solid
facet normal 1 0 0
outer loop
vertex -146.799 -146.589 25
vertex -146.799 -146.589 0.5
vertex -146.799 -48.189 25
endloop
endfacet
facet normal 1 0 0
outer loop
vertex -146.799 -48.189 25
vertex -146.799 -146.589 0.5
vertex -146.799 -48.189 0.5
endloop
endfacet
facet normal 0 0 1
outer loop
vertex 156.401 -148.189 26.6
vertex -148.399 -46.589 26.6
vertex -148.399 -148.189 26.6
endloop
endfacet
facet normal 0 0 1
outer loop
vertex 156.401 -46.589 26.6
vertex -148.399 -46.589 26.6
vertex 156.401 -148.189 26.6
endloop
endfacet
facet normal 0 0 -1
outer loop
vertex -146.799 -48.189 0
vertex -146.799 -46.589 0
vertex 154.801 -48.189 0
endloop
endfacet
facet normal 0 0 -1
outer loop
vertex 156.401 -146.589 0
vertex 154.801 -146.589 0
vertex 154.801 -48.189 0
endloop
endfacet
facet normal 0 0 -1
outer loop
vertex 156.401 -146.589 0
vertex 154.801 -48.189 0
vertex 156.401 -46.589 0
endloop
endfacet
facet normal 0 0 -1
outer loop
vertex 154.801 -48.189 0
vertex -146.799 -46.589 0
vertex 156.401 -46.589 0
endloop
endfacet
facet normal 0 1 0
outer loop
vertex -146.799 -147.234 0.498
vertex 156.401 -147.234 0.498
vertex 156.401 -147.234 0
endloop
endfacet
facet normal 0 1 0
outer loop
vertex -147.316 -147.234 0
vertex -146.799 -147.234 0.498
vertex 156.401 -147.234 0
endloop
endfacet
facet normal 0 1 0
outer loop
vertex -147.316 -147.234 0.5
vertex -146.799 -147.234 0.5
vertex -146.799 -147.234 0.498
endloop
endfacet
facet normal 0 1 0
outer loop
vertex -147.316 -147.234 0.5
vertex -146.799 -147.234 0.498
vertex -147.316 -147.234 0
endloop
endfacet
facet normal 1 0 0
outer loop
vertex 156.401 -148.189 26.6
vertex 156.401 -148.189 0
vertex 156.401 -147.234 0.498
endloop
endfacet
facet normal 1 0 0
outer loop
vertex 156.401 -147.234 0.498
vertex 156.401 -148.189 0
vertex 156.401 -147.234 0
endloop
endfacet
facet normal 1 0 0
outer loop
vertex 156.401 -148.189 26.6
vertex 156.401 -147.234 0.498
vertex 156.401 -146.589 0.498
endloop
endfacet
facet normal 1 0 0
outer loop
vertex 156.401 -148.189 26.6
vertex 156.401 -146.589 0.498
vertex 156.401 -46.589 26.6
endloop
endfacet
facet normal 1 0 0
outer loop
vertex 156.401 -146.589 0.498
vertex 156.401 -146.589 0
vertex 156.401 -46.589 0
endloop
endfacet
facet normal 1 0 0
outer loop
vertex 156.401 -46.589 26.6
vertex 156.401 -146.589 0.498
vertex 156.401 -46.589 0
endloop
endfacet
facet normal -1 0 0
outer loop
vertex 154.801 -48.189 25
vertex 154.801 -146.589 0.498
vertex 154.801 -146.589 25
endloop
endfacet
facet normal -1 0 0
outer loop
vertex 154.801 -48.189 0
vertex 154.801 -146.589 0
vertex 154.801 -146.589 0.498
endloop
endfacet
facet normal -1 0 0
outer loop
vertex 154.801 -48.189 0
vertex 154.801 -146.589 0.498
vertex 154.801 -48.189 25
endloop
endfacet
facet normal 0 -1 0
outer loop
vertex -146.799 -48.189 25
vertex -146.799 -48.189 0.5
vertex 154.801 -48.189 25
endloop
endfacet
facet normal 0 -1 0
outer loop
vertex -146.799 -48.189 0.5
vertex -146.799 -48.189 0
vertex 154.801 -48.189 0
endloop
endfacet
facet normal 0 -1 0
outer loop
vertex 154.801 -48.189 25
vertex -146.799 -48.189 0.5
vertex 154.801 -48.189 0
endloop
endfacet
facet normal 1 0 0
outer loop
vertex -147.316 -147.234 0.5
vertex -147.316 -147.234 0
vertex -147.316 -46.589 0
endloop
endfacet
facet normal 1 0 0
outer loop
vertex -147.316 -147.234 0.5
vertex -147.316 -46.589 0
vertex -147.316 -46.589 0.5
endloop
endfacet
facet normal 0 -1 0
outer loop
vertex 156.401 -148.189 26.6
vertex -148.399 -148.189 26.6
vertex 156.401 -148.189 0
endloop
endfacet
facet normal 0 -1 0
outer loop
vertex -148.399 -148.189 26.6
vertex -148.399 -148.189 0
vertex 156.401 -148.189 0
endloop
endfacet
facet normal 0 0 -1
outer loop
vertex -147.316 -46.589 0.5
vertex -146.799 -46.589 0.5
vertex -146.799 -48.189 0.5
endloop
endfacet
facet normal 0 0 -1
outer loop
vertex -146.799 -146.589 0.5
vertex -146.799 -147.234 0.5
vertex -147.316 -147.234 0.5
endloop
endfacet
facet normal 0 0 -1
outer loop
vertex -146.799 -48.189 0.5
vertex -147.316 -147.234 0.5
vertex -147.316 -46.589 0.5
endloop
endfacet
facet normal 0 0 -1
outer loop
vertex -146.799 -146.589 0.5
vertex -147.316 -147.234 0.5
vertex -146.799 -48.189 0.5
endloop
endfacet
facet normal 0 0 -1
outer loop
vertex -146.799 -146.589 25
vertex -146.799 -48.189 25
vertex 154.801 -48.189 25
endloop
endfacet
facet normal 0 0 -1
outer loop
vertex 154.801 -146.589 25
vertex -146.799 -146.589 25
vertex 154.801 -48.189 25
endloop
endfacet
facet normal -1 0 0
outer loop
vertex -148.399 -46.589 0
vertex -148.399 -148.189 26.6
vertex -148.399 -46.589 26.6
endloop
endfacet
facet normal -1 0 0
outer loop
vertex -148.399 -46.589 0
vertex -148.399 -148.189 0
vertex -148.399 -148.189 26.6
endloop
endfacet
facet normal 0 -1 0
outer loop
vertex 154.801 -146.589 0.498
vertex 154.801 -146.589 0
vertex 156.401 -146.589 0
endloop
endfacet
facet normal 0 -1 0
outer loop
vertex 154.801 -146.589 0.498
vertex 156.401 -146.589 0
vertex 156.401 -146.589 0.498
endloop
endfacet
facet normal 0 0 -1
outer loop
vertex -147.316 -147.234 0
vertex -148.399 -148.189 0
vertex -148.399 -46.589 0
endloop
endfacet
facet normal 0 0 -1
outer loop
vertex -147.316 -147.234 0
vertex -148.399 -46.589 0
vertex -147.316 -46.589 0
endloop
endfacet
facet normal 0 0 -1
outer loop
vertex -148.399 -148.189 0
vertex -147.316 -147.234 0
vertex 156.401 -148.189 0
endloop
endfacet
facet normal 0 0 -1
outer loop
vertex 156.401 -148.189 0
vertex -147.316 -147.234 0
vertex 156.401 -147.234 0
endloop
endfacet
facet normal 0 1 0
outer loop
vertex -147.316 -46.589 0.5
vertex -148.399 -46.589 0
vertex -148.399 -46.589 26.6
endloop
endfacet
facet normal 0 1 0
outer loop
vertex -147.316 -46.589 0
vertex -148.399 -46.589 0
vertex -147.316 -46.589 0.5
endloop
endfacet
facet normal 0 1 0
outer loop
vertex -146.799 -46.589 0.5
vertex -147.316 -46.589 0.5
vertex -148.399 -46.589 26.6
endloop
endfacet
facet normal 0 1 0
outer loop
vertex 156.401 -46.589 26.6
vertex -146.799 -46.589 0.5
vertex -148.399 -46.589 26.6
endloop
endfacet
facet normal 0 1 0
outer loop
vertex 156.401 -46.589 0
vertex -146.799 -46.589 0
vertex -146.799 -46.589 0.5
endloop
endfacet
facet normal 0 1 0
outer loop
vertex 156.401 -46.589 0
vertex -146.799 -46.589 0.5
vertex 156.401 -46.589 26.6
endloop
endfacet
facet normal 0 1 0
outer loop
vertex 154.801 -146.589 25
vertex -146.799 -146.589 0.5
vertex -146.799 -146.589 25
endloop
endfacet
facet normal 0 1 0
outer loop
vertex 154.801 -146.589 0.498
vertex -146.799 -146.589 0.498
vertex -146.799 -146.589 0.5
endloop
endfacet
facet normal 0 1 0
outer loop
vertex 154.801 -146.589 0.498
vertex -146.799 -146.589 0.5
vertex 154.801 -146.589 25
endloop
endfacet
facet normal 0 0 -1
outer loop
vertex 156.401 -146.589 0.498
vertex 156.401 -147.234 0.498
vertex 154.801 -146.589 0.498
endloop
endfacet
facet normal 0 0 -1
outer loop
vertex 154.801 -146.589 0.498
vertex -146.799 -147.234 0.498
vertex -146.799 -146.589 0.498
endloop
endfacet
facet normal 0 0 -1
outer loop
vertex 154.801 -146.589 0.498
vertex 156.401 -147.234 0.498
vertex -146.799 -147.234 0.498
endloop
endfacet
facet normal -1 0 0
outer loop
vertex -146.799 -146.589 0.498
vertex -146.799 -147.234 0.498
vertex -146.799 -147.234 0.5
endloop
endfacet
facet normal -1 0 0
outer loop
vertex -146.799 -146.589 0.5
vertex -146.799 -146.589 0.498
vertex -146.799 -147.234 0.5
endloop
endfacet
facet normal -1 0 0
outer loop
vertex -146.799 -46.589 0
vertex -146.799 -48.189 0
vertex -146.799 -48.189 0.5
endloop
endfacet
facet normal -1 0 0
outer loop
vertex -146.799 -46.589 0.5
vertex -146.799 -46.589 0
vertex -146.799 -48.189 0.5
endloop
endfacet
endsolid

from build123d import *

# Parameters (mm, degrees)
F0_W     = 304.8
F0_H     = 101.6
F0_W_2   = 301.6
F0_H_2   = 98.4
F1_DEPTH = 25
F2_W     = 304.8
F2_H     = 101.6
F3_DEPTH = 1.6
F4_W     = 0.644748
F4_H     = 0.498444
F5_DEPTH = 303.2
F6_W     = 0.51682
F6_H     = 0.5
F7_DEPTH = 100.644748


with BuildPart() as f1:
    # F0 (on Top) → F1 (new body)
    with BuildSketch(Plane.XY):
        with Locations((4.001044, -97.389185)):
            Rectangle(F0_W, F0_H)
        with Locations((4.001044, -97.389185)):
            Rectangle(F0_W_2, F0_H_2, mode=Mode.SUBTRACT)
    extrude(amount=F1_DEPTH)

    # F2 (on face) → F3 (join)
    with BuildSketch(Plane.XY.offset(25)):
        with Locations((4.001044, -97.389185)):
            Rectangle(F2_W, F2_H)
    extrude(amount=F3_DEPTH)

    # F4 (on face) → F5 (cut, through all)
    with BuildSketch(Plane.YZ.offset(-146.798956)):
        with Locations((-146.911559, 0.249222)):
            Rectangle(F4_W, F4_H)
    extrude(amount=F5_DEPTH, mode=Mode.SUBTRACT)

    # F6 (on face) → F7 (cut, through all)
    with BuildSketch(Plane(origin=(0, -147.233933, 0), x_dir=(-1, 0, 0), z_dir=(0, 1, 0))):
        with Locations((147.057366, 0.25)):
            Rectangle(F6_W, F6_H)
    extrude(amount=F7_DEPTH, mode=Mode.SUBTRACT)


solid = f1.part
